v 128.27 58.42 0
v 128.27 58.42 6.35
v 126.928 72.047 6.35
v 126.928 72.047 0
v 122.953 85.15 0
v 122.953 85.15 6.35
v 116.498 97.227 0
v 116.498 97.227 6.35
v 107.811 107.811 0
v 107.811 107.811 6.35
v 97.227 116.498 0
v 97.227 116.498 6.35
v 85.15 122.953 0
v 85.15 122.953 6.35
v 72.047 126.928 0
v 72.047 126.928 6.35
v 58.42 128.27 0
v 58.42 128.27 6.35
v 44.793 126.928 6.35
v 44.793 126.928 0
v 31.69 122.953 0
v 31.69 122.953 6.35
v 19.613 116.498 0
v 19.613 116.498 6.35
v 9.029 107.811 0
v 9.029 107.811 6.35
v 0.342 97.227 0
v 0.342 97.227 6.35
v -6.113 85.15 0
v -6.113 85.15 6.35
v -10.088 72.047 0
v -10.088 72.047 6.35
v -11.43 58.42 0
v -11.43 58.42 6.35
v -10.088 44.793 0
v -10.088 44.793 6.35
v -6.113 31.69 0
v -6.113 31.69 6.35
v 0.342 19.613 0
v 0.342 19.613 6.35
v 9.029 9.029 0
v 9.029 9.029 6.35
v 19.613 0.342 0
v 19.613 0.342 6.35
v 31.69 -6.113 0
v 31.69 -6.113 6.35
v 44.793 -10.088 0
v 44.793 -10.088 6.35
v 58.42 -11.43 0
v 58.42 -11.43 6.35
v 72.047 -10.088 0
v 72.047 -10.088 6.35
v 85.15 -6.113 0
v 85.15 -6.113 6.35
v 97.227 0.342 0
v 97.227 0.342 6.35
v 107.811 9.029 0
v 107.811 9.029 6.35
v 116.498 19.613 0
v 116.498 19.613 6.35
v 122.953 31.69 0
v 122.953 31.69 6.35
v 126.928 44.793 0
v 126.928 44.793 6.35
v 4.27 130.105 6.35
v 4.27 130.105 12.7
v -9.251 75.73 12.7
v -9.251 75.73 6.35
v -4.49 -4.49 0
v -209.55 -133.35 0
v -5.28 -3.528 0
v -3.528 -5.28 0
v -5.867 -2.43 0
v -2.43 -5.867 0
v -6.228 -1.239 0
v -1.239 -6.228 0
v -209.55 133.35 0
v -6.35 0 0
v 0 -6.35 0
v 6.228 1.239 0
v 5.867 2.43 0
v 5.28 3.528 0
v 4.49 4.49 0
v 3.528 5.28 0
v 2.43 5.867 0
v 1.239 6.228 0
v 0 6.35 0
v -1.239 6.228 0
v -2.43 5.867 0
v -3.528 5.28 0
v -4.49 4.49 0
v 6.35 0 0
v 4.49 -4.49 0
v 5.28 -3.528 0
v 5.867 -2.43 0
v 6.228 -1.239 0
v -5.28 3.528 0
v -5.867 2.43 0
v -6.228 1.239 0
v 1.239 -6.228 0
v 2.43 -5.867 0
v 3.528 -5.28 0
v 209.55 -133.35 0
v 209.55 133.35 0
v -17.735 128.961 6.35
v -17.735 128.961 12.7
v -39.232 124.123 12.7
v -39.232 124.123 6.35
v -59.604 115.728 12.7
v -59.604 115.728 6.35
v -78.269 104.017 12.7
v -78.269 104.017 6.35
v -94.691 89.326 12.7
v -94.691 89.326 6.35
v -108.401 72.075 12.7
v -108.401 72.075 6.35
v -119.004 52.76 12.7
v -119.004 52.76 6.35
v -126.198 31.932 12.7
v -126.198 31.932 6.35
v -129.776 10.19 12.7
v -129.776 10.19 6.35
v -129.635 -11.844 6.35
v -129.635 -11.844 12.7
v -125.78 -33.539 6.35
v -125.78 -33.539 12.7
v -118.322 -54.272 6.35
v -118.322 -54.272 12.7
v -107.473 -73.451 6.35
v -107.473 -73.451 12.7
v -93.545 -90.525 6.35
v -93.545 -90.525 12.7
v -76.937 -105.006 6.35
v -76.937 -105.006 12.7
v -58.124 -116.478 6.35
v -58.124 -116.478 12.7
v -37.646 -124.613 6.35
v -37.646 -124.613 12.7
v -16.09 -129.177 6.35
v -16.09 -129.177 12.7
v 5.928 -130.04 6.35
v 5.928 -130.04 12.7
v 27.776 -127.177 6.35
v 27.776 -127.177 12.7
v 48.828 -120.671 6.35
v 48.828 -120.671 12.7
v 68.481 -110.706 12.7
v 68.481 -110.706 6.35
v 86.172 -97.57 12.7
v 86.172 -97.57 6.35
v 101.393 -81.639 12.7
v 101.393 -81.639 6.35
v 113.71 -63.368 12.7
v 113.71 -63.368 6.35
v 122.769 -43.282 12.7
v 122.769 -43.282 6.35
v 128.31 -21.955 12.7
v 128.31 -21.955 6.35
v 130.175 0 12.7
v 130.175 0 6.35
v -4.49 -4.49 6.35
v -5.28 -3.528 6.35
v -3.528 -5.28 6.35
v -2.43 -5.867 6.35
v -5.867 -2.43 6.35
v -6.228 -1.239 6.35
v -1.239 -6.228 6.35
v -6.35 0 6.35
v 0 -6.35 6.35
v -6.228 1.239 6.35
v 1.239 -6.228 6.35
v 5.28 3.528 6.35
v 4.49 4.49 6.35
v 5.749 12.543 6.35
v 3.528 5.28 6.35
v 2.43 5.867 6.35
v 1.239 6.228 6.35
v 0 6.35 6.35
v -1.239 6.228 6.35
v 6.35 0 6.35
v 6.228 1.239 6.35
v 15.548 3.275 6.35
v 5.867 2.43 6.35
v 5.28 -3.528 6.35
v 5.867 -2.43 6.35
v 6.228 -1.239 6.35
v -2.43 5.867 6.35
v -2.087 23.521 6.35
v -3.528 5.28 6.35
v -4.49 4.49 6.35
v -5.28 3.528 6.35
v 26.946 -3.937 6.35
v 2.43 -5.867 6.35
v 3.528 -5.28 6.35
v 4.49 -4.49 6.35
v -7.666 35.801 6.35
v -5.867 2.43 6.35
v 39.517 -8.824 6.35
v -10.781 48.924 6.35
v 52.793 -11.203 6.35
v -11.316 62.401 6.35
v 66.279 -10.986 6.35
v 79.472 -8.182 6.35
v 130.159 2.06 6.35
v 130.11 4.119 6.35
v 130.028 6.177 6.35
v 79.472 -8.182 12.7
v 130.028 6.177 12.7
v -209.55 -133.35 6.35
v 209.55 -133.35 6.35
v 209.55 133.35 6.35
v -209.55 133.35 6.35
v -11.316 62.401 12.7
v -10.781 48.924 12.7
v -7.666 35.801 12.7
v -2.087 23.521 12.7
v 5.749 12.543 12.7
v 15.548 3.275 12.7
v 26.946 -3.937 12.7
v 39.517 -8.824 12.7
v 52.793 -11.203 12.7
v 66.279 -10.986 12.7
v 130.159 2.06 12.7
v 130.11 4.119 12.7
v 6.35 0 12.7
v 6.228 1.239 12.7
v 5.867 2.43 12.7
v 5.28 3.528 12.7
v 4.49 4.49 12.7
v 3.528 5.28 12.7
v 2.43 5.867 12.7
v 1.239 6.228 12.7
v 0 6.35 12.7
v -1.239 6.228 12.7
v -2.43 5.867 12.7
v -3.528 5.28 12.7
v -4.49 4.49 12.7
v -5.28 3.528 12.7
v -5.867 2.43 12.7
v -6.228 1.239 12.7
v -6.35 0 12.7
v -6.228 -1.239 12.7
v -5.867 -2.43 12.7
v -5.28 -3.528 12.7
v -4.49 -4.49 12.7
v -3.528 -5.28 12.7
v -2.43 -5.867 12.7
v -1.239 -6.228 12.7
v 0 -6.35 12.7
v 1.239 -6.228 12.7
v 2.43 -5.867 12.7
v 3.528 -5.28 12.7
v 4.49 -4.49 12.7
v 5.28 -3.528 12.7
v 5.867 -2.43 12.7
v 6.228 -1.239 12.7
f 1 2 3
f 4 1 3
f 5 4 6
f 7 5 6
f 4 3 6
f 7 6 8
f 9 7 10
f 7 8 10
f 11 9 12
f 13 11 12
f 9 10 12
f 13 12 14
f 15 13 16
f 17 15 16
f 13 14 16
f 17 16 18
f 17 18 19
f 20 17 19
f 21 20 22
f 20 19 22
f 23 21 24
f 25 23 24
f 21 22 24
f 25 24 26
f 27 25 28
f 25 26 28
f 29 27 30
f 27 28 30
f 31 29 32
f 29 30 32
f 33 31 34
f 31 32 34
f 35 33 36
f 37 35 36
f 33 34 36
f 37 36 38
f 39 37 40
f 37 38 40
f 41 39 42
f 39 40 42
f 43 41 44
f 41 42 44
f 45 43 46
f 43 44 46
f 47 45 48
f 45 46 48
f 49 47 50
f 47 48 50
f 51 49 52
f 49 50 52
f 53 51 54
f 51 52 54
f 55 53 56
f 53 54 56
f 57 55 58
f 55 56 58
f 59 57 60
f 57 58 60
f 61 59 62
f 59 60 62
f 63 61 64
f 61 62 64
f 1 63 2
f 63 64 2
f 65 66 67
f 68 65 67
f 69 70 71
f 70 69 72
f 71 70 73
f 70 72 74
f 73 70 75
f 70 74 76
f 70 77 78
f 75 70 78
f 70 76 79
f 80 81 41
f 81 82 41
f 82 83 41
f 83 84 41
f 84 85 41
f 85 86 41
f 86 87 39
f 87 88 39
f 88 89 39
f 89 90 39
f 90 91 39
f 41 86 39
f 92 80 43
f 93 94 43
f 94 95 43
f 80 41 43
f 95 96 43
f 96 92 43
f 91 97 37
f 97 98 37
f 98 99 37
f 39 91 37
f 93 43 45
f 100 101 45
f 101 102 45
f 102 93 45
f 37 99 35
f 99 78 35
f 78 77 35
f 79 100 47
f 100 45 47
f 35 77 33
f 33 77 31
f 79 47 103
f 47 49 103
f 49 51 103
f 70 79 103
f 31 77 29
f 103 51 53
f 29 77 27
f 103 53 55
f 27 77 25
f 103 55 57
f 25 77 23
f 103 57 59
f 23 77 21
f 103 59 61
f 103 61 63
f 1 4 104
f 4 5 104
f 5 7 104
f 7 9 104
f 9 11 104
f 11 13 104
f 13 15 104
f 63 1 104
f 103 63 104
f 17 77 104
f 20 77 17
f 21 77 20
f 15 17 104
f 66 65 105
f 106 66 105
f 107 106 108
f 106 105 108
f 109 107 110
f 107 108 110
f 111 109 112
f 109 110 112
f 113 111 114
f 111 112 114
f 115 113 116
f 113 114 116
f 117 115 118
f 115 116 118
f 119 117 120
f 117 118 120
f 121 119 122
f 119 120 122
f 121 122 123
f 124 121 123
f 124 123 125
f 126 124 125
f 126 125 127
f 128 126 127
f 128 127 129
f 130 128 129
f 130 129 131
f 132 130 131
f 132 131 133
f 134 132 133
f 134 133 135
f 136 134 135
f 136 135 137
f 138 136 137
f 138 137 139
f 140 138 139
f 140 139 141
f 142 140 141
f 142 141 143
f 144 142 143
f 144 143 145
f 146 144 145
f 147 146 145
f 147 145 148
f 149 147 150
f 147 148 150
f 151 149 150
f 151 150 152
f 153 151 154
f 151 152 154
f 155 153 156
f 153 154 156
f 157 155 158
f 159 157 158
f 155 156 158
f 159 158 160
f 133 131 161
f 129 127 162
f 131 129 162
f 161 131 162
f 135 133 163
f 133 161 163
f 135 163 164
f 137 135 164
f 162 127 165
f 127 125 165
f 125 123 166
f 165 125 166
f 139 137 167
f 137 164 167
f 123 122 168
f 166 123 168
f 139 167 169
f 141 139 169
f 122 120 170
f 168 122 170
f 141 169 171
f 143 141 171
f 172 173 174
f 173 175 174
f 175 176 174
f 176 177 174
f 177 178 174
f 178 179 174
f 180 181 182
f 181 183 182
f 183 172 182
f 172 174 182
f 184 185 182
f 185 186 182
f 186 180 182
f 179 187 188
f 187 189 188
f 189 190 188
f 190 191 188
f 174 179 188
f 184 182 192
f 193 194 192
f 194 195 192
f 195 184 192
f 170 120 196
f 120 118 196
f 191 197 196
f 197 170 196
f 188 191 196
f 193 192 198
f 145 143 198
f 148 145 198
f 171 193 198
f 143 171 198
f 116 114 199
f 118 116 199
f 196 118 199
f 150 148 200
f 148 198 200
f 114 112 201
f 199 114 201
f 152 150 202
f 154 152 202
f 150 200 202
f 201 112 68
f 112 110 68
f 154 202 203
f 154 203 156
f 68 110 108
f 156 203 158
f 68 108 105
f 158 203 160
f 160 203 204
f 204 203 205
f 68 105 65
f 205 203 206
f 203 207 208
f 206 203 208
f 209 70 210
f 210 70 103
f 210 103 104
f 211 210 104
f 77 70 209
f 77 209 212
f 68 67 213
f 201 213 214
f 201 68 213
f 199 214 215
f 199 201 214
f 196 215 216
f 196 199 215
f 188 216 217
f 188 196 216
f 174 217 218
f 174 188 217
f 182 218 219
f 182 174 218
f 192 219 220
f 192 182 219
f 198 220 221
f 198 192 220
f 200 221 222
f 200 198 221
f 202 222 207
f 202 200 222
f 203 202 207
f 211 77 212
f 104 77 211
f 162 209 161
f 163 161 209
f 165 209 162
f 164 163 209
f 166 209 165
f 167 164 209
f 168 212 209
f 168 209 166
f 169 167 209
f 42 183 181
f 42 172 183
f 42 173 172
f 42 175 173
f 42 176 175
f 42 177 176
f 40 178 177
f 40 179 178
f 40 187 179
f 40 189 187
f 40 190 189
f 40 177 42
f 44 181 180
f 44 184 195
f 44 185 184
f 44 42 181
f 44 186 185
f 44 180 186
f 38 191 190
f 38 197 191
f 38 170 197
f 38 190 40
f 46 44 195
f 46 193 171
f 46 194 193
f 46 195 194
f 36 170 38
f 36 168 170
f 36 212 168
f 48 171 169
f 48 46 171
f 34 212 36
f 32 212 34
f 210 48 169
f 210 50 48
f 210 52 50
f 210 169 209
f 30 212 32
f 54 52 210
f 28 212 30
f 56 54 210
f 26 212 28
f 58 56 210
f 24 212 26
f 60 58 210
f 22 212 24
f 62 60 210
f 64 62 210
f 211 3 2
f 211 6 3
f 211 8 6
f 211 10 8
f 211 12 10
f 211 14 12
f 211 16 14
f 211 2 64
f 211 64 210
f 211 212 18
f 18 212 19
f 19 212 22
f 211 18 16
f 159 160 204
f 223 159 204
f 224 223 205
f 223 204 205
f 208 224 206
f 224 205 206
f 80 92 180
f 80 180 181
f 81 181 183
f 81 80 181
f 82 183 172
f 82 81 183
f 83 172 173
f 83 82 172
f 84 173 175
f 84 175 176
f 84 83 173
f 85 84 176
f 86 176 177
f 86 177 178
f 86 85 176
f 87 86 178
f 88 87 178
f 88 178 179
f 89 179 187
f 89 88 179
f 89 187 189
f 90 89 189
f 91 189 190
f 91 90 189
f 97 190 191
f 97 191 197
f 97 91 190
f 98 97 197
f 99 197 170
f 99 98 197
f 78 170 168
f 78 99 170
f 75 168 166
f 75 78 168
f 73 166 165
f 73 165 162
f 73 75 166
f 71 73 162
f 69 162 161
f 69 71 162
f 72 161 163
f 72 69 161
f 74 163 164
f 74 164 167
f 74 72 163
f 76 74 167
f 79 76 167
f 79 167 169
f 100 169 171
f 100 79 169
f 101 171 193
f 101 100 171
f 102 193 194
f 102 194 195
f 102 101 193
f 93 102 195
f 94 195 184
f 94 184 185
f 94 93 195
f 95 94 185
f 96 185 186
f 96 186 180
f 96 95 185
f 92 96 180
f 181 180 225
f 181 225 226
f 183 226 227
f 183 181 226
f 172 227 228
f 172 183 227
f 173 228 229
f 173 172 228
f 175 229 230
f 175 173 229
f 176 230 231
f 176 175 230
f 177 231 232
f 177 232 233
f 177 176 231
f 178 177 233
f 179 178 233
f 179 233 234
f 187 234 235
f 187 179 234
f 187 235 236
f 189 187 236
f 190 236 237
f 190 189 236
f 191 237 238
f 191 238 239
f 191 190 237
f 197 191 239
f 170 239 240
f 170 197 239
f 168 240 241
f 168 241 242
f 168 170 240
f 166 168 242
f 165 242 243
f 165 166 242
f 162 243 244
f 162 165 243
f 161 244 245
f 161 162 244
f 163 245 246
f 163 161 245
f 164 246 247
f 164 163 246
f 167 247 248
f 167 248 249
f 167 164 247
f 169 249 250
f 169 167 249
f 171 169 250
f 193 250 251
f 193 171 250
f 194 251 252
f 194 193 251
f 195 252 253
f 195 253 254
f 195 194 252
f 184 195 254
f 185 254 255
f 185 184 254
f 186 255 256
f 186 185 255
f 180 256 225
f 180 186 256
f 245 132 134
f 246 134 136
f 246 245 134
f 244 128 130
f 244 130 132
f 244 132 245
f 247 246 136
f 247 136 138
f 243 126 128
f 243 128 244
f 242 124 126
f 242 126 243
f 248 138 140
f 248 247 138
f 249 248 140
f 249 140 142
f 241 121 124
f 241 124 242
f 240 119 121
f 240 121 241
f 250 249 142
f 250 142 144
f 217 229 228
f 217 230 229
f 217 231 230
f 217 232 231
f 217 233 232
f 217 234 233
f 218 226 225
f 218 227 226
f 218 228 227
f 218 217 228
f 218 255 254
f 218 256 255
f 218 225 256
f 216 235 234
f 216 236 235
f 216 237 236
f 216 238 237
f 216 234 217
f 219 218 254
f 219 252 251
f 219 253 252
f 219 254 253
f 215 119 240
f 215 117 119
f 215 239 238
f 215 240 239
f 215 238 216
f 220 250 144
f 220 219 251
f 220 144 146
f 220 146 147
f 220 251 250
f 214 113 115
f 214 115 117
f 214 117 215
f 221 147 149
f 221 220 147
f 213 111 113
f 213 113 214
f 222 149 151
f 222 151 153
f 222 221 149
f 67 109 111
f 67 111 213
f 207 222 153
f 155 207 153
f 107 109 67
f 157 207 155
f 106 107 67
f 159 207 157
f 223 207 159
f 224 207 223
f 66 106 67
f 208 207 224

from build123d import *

# Parameters (mm, degrees)
F0_W     = 419.1
F0_H     = 266.7
F0_R     = 6.35
F1_DEPTH = 6.35
F2_R     = 69.85
F3_DEPTH = 6.35
F4_R     = 6.35
F5_DEPTH = 6.35
F6_DEPTH = 25.4
F8_DEPTH = 25.4


with BuildPart() as f1:
    # F0 (on Top) → F1 (new body)
    with BuildSketch(Plane.XY):
        Rectangle(F0_W, F0_H)
        Circle(F0_R, mode=Mode.SUBTRACT)
    extrude(amount=F1_DEPTH)

    # F2 (on face) → F3 (cut, through all)
    with BuildSketch(Plane.XY.offset(6.35)):
        with Locations((58.42, 58.42)):
            Circle(F2_R)
    extrude(amount=-F3_DEPTH, mode=Mode.SUBTRACT)


with BuildPart() as f5:
    # F4 (on face) → F5 (new body)
    with BuildSketch(Plane.XY.offset(6.35)):
        with BuildLine():
            ThreePointArc((36.8406854071, 124.8530917668), (-104.2623298413, -77.9416268823), (130.175, 0))
            ThreePointArc((130.175, 0), (128.8376533583, 18.6115475479), (124.8530917668, 36.8406854071))
            ThreePointArc((124.8530917668, 36.8406854071), (9.0285913341, 9.0285913341), (36.8406854071, 124.8530917668))
        make_face()
        Circle(F4_R, mode=Mode.SUBTRACT)
        with BuildLine():
            ThreePointArc((36.8406854071, 124.8530917668), (9.0285913341, 9.0285913341), (124.8530917668, 36.8406854071))
            ThreePointArc((124.8530917668, 36.8406854071), (92.047625241, 92.047625241), (36.8406854071, 124.8530917668))
        make_face()
    extrude(amount=F5_DEPTH)

    # F2 (on face) → F6 (cut)
    with BuildSketch(Plane.XY.offset(6.35)):
        with Locations((58.42, 58.42)):
            Circle(F2_R)
    extrude(amount=F6_DEPTH, mode=Mode.SUBTRACT)

    # F7 (on face) → F8 (cut)
    with BuildSketch(Plane.XY.offset(12.7)):
        with BuildLine():
            ThreePointArc((36.8406854071, 124.8530917668), (7.481865656, 106.2146541943), (-9.2512492182, 75.7296657751))
            Line((-9.2512492182, 75.7296657751), (36.8406854071, 65.8533647656))
            Line((36.8406854071, 65.8533647656), (49.260482192, 140.2665227652))
            Line((49.260482192, 140.2665227652), (4.2698969352, 130.1049522699))
            ThreePointArc((4.2698969352, 130.1049522699), (20.7223431305, 128.5150384982), (36.8406854071, 124.8530917668))
        make_face()
        with BuildLine():
            Line((4.2698969352, 130.1049522699), (-9.2512492182, 75.7296657751))
            ThreePointArc((-9.2512492182, 75.7296657751), (7.481865656, 106.2146541943), (36.8406854071, 124.8530917668))
            ThreePointArc((36.8406854071, 124.8530917668), (20.7223431305, 128.5150384982), (4.2698969352, 130.1049522699))
        make_face()
        with BuildLine():
            Line((127.2549563477, 54.1487200117), (75.5184735859, -9.3049193505))
            Line((75.5184735859, -9.3049193505), (79.4723410938, -8.1819626923))
            ThreePointArc((79.4723410938, -8.1819626923), (107.6153753027, 8.833332953), (124.8530917668, 36.8406854071))
            ThreePointArc((124.8530917668, 36.8406854071), (128.3596935609, 21.6637876178), (130.0283778221, 6.1766970102))
            Line((130.0283778221, 6.1766970103), (140.0697380304, 9.0285913341))
            Line((140.0697380304, 9.0285913341), (127.2549563477, 54.1487200117))
        make_face()
        with BuildLine():
            Line((79.4723410938, -8.1819626923), (130.0283778221, 6.1766970103))
            ThreePointArc((130.0283778221, 6.1766970102), (128.3596935609, 21.6637876178), (124.8530917668, 36.8406854071))
            ThreePointArc((124.8530917668, 36.8406854071), (107.6153753027, 8.833332953), (79.4723410938, -8.1819626923))
        make_face()
    extrude(amount=-F8_DEPTH, mode=Mode.SUBTRACT)


solid = Compound([f1.part, f5.part])
